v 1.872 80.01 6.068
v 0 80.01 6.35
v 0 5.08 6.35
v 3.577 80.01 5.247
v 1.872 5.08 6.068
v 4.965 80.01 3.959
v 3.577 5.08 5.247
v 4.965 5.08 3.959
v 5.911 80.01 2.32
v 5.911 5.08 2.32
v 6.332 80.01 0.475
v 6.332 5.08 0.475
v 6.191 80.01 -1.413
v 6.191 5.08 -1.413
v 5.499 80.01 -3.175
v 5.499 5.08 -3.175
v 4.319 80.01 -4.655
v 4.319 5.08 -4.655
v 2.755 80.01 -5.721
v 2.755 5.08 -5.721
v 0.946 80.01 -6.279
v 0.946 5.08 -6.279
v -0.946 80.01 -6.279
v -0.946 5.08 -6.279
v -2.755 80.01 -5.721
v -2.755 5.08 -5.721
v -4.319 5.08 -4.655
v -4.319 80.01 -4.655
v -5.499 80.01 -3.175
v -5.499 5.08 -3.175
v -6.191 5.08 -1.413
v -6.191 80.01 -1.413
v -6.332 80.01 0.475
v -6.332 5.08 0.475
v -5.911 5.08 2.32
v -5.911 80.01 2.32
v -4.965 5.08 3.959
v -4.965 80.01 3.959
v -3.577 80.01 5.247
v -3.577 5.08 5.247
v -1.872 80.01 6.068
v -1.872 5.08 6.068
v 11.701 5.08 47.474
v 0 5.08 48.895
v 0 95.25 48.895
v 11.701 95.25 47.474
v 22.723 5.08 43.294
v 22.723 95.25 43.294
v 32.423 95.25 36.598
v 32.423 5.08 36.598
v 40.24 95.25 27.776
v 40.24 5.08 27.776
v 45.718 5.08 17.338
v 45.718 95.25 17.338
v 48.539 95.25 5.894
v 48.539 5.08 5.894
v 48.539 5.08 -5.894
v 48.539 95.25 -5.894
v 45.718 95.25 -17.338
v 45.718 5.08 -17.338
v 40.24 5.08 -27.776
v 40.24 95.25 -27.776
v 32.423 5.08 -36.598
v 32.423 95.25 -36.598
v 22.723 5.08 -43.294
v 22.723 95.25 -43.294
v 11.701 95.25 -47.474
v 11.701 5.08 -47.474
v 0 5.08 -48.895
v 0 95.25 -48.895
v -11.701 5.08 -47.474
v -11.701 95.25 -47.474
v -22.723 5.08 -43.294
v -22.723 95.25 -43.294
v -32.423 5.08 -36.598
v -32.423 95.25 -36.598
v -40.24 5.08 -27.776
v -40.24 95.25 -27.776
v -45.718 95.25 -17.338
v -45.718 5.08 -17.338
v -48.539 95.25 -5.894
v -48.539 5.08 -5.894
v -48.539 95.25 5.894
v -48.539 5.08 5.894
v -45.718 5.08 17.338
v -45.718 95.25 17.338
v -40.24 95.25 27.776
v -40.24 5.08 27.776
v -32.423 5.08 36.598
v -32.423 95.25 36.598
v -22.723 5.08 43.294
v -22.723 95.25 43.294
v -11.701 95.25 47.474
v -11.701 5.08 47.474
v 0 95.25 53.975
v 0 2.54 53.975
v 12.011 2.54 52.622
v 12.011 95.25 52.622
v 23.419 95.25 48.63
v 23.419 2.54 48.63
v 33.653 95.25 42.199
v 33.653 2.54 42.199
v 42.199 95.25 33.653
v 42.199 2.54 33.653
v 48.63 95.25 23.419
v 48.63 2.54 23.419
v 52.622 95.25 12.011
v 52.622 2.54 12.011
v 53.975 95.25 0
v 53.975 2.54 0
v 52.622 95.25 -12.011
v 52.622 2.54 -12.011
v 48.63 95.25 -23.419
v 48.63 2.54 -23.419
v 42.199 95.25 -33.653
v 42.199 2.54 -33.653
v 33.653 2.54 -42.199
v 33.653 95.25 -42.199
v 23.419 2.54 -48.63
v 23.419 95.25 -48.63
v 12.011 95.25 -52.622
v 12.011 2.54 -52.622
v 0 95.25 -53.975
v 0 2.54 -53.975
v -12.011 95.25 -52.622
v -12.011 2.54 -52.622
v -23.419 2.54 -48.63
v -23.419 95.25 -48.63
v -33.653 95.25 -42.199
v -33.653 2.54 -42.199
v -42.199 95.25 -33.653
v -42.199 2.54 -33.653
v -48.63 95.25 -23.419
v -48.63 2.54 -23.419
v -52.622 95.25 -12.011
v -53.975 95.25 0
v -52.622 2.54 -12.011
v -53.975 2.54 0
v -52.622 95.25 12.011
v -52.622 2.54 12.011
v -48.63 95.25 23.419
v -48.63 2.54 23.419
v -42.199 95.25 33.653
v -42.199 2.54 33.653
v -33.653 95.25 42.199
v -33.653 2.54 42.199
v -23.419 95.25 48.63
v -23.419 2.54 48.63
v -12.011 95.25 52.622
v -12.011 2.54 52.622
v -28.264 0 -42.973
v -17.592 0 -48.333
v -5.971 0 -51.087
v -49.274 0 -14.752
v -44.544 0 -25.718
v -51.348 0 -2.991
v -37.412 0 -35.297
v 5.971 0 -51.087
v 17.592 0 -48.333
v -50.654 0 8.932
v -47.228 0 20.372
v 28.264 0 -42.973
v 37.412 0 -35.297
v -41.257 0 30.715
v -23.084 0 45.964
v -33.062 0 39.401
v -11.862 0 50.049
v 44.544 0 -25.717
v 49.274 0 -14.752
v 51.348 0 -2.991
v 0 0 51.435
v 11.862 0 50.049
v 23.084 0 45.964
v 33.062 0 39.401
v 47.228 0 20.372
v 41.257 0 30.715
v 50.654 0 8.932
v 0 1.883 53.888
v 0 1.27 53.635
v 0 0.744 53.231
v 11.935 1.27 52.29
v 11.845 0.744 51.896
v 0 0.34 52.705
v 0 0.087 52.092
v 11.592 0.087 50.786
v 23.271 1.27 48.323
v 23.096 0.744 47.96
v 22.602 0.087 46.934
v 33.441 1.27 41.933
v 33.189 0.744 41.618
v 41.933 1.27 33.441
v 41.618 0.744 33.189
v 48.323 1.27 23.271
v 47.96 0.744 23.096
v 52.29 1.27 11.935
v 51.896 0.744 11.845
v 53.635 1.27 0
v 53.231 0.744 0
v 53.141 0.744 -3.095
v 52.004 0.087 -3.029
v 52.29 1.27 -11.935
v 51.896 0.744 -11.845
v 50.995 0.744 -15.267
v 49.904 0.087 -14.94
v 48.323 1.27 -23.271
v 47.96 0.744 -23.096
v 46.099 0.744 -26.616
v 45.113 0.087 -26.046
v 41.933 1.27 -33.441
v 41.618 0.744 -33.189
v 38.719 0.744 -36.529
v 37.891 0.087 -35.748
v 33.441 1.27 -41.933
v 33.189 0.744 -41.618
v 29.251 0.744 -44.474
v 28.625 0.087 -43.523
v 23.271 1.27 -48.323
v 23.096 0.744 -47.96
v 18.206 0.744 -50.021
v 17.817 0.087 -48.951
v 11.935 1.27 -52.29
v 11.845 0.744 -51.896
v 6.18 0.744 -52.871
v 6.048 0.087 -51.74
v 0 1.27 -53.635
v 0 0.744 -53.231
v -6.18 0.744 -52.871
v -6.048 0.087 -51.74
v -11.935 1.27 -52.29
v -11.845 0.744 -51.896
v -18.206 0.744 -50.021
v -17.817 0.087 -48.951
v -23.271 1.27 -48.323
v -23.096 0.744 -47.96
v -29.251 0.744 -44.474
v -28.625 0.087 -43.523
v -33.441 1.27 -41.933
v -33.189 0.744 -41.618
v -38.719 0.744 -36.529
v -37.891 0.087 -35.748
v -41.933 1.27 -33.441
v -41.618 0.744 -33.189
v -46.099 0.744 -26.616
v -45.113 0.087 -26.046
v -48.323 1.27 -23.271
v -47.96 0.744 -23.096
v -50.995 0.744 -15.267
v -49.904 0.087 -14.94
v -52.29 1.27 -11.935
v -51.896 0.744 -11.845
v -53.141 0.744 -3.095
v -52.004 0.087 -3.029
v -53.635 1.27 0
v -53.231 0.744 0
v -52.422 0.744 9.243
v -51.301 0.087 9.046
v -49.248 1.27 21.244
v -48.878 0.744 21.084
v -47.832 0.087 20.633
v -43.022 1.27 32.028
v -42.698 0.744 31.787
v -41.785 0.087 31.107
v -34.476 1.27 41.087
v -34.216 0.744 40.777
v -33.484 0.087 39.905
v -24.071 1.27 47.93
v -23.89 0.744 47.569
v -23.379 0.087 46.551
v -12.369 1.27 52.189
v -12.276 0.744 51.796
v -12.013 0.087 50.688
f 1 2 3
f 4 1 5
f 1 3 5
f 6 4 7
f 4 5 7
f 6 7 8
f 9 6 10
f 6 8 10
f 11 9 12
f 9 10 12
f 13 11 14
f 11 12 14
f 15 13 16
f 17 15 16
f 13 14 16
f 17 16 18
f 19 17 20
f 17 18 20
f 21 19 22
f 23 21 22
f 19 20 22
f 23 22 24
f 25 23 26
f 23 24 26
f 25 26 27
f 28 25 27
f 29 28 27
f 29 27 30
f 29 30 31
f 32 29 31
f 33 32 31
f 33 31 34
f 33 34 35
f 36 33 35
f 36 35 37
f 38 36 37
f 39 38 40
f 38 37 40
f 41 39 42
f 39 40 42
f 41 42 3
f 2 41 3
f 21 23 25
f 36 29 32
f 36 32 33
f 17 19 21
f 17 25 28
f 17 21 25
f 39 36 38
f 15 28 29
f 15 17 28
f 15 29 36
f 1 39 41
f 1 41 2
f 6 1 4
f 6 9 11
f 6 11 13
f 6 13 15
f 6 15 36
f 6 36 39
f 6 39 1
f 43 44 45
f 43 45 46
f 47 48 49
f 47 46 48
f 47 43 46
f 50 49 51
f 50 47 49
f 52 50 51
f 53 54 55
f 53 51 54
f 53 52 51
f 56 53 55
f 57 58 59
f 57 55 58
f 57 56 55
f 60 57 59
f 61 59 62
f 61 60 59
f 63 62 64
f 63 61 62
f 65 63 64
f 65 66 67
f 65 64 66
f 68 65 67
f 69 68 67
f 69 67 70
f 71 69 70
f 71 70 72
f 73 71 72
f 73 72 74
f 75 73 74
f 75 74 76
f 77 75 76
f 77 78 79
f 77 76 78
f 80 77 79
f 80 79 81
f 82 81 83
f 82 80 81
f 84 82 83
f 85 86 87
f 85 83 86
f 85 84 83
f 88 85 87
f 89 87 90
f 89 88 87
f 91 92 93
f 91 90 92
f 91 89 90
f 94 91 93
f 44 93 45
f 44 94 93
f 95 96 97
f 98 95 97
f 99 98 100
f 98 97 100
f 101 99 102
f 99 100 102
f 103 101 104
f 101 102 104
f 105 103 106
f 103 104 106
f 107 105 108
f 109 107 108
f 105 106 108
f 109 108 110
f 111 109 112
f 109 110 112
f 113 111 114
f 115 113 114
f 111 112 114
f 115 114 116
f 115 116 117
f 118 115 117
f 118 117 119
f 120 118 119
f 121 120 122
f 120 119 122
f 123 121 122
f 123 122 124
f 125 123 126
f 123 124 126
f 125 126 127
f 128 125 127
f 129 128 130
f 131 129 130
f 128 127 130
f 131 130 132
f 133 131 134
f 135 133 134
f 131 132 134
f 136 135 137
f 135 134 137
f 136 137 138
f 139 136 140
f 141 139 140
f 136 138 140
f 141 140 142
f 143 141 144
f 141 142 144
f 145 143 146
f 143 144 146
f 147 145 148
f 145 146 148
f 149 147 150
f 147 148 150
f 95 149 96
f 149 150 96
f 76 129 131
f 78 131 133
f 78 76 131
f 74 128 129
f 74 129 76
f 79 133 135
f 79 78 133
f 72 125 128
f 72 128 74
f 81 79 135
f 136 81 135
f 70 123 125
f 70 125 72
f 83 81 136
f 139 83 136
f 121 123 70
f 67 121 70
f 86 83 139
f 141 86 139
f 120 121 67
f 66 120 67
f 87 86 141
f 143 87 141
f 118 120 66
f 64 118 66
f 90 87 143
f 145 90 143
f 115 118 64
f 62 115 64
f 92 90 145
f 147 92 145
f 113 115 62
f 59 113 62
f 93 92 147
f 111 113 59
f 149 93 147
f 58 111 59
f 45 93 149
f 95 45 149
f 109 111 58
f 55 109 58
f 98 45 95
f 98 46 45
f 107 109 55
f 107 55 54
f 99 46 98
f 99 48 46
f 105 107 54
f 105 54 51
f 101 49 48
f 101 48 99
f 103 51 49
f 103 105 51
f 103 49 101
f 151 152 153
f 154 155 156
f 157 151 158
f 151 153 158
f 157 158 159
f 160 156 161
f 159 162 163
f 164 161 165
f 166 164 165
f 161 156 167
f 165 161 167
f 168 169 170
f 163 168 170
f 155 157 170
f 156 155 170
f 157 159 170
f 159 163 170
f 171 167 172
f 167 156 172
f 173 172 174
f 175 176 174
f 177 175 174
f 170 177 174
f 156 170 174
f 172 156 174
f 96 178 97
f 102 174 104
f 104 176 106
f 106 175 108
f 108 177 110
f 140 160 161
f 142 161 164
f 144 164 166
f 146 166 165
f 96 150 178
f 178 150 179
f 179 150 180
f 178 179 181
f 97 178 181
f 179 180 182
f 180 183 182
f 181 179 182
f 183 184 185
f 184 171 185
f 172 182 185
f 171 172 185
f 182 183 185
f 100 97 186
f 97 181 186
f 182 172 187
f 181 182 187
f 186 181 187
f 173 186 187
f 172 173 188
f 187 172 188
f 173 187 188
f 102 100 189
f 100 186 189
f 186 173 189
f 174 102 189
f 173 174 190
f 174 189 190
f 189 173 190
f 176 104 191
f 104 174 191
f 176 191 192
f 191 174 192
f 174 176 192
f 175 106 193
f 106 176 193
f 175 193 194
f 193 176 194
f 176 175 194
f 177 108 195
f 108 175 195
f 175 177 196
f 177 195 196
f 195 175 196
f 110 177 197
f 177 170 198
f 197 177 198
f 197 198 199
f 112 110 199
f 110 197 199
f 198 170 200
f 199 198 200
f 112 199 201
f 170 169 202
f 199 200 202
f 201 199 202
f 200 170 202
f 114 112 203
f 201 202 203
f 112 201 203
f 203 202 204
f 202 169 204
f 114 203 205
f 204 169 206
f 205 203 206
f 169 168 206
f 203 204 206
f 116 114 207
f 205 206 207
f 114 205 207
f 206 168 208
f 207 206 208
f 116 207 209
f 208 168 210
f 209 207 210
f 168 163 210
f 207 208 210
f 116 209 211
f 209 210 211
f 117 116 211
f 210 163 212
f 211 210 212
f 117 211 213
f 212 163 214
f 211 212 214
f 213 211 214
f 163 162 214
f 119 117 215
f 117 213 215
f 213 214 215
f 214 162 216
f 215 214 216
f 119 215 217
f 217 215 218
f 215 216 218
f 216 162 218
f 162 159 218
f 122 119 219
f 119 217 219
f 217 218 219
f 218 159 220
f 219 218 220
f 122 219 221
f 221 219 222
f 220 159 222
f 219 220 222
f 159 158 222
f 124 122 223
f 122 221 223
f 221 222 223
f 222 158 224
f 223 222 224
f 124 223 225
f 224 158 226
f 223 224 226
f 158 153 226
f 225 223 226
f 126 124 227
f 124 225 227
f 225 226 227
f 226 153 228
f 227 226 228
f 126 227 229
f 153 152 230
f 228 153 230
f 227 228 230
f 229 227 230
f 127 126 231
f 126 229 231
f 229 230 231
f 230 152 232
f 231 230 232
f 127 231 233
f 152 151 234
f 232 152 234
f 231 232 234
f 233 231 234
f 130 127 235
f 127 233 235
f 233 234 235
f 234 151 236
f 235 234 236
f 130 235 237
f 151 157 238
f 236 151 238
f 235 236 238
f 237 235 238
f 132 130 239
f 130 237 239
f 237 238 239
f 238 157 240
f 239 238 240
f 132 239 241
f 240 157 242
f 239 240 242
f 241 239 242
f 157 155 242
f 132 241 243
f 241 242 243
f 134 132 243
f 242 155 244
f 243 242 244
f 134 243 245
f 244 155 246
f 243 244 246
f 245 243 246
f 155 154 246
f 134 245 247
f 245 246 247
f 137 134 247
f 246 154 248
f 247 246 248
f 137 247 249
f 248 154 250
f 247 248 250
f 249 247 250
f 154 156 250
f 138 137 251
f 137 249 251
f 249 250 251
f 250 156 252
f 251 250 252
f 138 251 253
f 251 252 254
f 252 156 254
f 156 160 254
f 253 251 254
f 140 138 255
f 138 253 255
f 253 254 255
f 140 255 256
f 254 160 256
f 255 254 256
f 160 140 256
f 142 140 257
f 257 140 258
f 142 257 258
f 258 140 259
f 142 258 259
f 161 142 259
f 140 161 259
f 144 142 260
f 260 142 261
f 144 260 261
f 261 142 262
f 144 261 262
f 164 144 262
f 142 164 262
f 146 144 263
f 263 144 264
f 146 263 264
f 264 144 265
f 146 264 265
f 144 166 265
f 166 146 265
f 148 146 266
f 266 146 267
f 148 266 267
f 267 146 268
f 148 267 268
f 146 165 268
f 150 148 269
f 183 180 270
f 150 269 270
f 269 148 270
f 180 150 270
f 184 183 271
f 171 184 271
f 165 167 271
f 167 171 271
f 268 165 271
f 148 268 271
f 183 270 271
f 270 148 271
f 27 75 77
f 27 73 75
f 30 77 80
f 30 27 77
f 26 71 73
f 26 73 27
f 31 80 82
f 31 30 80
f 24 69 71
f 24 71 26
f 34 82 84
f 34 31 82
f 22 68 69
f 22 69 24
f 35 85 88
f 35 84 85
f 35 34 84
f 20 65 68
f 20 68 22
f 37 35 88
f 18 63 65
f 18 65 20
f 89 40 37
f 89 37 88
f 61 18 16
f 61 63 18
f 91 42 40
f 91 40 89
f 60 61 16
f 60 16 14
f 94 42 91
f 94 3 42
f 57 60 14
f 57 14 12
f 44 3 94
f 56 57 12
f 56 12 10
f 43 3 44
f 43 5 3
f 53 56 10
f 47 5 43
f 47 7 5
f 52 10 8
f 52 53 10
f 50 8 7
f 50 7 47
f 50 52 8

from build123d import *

# Parameters (mm, degrees)
SKETCH1_R           = 53.975
BOSS_EXTRUDE1_DEPTH = 95.25
SHELL1_T            = -5.08
SKETCH2_R           = 6.35
BOSS_EXTRUDE2_DEPTH = 74.93
FILLET1_R           = 2.54


with BuildPart() as part:
    # Sketch1 → Boss-Extrude1 (new body)
    with BuildSketch(Plane(origin=(0, 0, 0), x_dir=(1, 0, 0), z_dir=(0, 1, 0))):
        Circle(SKETCH1_R)
    extrude(amount=BOSS_EXTRUDE1_DEPTH)

    # Shell1
    shell1_openings = [part.faces().sort_by_distance(p)[0] for p in [
        (0, 95.25, 0),
    ]]
    offset(amount=SHELL1_T, openings=shell1_openings, kind=Kind.INTERSECTION)

    # Sketch2 → Boss-Extrude2 (add)
    with BuildSketch(Plane(origin=(0, 5.08, 0), x_dir=(1, 0, 0), z_dir=(0, 1, 0))):
        Circle(SKETCH2_R)
    extrude(amount=BOSS_EXTRUDE2_DEPTH)

    # Fillet1
    fillet1_edges = [part.edges().sort_by_distance(p)[0] for p in [
        (-53.975, 0, 0),
    ]]
    fillet(fillet1_edges, radius=FILLET1_R)


solid = part.part
